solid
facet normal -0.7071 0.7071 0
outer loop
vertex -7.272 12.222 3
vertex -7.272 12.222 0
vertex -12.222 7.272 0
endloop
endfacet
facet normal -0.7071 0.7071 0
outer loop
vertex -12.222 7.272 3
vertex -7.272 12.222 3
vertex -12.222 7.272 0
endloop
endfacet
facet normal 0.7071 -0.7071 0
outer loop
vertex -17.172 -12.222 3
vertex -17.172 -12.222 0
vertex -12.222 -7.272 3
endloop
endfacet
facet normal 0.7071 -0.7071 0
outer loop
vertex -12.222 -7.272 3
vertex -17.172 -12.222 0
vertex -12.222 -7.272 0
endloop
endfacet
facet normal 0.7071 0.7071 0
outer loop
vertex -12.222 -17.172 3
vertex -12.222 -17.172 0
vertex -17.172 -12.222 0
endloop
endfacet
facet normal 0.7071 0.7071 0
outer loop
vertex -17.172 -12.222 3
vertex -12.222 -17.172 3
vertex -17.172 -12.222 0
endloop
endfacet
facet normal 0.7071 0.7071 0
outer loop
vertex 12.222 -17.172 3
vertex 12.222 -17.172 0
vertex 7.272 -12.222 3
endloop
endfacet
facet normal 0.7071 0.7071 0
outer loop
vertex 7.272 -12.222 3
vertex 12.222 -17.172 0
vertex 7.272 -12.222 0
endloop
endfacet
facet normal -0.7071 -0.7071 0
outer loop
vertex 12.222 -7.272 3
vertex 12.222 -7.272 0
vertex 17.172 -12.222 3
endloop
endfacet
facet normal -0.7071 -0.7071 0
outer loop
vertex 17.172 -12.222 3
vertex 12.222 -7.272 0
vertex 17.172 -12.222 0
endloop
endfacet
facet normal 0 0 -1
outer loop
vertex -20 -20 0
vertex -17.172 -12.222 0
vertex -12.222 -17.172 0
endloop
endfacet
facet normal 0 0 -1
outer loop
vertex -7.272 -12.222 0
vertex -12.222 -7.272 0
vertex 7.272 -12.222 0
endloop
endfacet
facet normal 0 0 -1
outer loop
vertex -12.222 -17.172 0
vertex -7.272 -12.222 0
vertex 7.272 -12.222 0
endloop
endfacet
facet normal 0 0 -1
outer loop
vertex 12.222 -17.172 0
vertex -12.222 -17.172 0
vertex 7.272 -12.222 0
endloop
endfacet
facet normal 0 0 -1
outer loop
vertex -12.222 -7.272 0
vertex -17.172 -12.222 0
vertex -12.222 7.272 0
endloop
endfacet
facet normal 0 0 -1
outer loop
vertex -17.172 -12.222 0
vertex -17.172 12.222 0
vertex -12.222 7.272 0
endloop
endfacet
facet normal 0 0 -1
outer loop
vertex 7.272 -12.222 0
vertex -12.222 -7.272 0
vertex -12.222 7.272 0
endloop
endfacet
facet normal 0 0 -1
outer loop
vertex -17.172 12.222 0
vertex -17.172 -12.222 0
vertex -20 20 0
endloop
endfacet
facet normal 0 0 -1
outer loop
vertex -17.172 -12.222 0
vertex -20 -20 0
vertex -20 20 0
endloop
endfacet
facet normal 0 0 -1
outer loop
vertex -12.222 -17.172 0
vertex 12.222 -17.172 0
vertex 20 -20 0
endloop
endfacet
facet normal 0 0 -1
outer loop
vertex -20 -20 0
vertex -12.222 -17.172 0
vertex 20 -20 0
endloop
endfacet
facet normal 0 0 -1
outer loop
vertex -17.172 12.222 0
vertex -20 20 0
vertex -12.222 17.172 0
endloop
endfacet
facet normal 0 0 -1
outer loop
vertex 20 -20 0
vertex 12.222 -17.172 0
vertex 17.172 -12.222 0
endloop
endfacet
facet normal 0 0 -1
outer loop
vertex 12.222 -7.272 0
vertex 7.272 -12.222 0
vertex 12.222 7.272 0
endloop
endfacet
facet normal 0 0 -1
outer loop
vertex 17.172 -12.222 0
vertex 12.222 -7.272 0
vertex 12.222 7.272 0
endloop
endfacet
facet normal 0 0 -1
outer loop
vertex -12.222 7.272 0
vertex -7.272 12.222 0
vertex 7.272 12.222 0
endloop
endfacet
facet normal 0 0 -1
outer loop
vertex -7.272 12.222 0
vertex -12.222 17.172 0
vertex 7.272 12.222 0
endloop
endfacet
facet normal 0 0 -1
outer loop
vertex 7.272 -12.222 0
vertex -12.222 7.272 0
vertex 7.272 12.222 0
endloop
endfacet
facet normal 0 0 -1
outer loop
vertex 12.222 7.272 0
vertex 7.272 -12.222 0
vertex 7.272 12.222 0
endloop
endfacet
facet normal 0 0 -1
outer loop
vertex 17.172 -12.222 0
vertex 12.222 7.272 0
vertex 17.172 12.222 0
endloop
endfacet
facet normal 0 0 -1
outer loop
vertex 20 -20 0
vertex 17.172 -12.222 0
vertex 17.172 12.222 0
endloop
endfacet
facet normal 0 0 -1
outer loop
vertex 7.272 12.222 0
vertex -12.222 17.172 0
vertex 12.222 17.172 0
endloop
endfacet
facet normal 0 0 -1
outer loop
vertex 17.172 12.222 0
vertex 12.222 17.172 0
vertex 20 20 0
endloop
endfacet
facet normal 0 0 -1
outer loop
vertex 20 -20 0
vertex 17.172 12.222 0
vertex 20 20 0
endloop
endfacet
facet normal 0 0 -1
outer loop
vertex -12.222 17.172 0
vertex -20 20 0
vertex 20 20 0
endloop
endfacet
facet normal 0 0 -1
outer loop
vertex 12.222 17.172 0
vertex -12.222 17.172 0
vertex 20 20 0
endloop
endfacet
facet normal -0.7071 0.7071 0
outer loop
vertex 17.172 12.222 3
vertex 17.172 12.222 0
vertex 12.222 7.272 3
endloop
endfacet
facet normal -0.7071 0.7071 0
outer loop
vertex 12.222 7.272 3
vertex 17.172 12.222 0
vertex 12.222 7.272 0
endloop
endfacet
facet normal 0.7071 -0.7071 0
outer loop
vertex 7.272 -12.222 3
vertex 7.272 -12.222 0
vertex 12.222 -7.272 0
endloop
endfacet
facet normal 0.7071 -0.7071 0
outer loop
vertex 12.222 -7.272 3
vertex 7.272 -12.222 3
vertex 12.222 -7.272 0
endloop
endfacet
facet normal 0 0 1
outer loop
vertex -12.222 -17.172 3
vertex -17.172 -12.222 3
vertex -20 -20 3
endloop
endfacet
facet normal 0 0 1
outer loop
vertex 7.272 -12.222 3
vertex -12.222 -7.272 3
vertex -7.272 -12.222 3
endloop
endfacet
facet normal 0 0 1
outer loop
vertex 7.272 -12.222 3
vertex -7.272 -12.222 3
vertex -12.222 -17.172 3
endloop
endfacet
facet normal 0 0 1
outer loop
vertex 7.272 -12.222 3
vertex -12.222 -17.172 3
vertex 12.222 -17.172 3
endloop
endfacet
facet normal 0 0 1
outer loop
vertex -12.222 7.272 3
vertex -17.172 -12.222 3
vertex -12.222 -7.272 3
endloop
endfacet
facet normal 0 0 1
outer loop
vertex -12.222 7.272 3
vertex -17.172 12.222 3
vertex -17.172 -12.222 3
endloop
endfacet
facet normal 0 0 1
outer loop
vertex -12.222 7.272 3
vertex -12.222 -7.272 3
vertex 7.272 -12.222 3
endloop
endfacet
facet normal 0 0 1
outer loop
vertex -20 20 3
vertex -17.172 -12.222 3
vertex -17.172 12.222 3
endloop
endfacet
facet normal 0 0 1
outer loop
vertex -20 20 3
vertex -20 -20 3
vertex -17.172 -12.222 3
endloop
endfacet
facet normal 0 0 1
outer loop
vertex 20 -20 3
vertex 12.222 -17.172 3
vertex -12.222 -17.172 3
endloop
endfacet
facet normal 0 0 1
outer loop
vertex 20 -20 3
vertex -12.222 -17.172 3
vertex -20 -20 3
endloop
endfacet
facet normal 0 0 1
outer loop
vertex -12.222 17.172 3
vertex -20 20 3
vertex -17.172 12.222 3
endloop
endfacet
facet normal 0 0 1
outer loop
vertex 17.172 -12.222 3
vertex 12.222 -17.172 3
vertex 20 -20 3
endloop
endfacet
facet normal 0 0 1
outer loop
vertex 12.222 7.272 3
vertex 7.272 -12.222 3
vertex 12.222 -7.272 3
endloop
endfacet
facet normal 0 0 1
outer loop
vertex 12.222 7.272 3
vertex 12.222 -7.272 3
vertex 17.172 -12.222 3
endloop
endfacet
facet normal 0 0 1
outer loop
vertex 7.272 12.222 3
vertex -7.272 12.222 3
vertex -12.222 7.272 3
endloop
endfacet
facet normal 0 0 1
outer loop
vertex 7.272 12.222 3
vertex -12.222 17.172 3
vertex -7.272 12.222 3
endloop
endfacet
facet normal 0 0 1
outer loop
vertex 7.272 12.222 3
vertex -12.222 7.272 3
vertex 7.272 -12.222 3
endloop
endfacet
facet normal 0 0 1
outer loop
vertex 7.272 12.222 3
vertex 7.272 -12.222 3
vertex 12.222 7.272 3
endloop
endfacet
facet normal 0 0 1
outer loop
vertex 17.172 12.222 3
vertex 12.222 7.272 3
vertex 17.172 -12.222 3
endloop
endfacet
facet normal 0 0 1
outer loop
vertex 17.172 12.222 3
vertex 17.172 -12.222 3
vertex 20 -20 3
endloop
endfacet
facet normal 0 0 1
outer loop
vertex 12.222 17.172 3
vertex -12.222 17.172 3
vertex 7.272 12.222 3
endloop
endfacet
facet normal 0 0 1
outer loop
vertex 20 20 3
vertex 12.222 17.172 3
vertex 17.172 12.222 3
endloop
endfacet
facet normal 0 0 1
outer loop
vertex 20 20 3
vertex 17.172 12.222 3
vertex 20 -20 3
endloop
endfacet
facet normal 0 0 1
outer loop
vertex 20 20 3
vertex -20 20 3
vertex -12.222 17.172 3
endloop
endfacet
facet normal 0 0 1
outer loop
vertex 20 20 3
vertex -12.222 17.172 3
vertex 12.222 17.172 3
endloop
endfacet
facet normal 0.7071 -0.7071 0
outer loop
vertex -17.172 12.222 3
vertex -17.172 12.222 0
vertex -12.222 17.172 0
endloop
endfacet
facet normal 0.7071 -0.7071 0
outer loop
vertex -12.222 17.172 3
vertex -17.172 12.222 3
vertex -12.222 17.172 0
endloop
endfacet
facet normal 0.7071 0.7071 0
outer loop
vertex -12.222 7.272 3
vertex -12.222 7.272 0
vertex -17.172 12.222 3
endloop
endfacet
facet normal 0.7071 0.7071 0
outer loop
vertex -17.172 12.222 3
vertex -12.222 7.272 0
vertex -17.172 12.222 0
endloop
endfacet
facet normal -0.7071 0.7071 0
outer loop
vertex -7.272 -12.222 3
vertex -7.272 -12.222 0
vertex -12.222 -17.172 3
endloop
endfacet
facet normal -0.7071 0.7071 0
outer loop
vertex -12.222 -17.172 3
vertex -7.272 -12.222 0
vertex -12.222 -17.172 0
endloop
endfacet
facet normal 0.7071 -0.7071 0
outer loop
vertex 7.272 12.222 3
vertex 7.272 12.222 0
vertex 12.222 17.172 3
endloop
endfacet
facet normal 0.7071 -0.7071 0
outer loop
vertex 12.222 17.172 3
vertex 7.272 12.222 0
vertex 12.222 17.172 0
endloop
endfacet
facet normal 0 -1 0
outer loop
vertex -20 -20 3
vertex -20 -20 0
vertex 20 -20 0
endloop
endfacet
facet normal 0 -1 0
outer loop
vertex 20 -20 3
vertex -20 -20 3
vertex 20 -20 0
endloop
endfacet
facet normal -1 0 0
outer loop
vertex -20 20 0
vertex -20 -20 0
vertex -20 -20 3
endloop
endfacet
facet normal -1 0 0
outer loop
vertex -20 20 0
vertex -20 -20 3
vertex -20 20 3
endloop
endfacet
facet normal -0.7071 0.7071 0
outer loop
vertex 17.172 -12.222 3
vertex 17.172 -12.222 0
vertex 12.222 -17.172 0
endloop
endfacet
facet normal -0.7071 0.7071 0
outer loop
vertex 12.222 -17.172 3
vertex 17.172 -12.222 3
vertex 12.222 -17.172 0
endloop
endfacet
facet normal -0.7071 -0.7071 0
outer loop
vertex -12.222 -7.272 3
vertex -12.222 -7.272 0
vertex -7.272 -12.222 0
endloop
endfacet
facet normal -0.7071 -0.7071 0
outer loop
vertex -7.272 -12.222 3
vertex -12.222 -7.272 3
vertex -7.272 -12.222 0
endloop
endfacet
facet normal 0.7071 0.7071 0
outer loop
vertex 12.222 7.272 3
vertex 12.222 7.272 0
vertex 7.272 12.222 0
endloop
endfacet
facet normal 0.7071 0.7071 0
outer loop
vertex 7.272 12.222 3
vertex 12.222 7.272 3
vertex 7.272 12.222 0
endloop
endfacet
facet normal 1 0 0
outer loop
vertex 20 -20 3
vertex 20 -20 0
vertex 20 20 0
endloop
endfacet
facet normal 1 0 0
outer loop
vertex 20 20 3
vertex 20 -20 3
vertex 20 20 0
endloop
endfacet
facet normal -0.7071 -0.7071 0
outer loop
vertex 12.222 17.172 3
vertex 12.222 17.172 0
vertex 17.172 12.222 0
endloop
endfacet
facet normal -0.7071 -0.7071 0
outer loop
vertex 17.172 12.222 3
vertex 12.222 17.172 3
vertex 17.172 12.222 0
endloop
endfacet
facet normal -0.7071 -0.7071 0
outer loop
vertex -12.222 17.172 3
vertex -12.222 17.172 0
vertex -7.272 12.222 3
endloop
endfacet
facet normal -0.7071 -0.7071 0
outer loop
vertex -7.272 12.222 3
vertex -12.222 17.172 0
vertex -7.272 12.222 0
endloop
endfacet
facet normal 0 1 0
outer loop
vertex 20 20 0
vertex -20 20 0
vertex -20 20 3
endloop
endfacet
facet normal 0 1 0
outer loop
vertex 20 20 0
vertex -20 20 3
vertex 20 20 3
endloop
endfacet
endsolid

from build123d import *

# Parameters (mm, degrees)
F0_W     = 40
F0_H     = 40
F1_DEPTH = 3


with BuildPart() as f1:
    # F0 (on Top) → F1 (new body)
    with BuildSketch(Plane.XY):
        Rectangle(F0_W, F0_H)
        Polygon((-12.221825, -7.272078), (-7.272078, -12.221825), (-12.221825, -17.171573), (-17.171573, -12.221825), align=None, mode=Mode.SUBTRACT)
        Polygon((7.272078, -12.221825), (12.221825, -7.272078), (17.171573, -12.221825), (12.221825, -17.171573), align=None, mode=Mode.SUBTRACT)
        Polygon((-12.221825, 7.272078), (-17.171573, 12.221825), (-12.221825, 17.171573), (-7.272078, 12.221825), align=None, mode=Mode.SUBTRACT)
        Polygon((12.221825, 7.272078), (7.272078, 12.221825), (12.221825, 17.171573), (17.171573, 12.221825), align=None, mode=Mode.SUBTRACT)
    extrude(amount=F1_DEPTH)


solid = f1.part
